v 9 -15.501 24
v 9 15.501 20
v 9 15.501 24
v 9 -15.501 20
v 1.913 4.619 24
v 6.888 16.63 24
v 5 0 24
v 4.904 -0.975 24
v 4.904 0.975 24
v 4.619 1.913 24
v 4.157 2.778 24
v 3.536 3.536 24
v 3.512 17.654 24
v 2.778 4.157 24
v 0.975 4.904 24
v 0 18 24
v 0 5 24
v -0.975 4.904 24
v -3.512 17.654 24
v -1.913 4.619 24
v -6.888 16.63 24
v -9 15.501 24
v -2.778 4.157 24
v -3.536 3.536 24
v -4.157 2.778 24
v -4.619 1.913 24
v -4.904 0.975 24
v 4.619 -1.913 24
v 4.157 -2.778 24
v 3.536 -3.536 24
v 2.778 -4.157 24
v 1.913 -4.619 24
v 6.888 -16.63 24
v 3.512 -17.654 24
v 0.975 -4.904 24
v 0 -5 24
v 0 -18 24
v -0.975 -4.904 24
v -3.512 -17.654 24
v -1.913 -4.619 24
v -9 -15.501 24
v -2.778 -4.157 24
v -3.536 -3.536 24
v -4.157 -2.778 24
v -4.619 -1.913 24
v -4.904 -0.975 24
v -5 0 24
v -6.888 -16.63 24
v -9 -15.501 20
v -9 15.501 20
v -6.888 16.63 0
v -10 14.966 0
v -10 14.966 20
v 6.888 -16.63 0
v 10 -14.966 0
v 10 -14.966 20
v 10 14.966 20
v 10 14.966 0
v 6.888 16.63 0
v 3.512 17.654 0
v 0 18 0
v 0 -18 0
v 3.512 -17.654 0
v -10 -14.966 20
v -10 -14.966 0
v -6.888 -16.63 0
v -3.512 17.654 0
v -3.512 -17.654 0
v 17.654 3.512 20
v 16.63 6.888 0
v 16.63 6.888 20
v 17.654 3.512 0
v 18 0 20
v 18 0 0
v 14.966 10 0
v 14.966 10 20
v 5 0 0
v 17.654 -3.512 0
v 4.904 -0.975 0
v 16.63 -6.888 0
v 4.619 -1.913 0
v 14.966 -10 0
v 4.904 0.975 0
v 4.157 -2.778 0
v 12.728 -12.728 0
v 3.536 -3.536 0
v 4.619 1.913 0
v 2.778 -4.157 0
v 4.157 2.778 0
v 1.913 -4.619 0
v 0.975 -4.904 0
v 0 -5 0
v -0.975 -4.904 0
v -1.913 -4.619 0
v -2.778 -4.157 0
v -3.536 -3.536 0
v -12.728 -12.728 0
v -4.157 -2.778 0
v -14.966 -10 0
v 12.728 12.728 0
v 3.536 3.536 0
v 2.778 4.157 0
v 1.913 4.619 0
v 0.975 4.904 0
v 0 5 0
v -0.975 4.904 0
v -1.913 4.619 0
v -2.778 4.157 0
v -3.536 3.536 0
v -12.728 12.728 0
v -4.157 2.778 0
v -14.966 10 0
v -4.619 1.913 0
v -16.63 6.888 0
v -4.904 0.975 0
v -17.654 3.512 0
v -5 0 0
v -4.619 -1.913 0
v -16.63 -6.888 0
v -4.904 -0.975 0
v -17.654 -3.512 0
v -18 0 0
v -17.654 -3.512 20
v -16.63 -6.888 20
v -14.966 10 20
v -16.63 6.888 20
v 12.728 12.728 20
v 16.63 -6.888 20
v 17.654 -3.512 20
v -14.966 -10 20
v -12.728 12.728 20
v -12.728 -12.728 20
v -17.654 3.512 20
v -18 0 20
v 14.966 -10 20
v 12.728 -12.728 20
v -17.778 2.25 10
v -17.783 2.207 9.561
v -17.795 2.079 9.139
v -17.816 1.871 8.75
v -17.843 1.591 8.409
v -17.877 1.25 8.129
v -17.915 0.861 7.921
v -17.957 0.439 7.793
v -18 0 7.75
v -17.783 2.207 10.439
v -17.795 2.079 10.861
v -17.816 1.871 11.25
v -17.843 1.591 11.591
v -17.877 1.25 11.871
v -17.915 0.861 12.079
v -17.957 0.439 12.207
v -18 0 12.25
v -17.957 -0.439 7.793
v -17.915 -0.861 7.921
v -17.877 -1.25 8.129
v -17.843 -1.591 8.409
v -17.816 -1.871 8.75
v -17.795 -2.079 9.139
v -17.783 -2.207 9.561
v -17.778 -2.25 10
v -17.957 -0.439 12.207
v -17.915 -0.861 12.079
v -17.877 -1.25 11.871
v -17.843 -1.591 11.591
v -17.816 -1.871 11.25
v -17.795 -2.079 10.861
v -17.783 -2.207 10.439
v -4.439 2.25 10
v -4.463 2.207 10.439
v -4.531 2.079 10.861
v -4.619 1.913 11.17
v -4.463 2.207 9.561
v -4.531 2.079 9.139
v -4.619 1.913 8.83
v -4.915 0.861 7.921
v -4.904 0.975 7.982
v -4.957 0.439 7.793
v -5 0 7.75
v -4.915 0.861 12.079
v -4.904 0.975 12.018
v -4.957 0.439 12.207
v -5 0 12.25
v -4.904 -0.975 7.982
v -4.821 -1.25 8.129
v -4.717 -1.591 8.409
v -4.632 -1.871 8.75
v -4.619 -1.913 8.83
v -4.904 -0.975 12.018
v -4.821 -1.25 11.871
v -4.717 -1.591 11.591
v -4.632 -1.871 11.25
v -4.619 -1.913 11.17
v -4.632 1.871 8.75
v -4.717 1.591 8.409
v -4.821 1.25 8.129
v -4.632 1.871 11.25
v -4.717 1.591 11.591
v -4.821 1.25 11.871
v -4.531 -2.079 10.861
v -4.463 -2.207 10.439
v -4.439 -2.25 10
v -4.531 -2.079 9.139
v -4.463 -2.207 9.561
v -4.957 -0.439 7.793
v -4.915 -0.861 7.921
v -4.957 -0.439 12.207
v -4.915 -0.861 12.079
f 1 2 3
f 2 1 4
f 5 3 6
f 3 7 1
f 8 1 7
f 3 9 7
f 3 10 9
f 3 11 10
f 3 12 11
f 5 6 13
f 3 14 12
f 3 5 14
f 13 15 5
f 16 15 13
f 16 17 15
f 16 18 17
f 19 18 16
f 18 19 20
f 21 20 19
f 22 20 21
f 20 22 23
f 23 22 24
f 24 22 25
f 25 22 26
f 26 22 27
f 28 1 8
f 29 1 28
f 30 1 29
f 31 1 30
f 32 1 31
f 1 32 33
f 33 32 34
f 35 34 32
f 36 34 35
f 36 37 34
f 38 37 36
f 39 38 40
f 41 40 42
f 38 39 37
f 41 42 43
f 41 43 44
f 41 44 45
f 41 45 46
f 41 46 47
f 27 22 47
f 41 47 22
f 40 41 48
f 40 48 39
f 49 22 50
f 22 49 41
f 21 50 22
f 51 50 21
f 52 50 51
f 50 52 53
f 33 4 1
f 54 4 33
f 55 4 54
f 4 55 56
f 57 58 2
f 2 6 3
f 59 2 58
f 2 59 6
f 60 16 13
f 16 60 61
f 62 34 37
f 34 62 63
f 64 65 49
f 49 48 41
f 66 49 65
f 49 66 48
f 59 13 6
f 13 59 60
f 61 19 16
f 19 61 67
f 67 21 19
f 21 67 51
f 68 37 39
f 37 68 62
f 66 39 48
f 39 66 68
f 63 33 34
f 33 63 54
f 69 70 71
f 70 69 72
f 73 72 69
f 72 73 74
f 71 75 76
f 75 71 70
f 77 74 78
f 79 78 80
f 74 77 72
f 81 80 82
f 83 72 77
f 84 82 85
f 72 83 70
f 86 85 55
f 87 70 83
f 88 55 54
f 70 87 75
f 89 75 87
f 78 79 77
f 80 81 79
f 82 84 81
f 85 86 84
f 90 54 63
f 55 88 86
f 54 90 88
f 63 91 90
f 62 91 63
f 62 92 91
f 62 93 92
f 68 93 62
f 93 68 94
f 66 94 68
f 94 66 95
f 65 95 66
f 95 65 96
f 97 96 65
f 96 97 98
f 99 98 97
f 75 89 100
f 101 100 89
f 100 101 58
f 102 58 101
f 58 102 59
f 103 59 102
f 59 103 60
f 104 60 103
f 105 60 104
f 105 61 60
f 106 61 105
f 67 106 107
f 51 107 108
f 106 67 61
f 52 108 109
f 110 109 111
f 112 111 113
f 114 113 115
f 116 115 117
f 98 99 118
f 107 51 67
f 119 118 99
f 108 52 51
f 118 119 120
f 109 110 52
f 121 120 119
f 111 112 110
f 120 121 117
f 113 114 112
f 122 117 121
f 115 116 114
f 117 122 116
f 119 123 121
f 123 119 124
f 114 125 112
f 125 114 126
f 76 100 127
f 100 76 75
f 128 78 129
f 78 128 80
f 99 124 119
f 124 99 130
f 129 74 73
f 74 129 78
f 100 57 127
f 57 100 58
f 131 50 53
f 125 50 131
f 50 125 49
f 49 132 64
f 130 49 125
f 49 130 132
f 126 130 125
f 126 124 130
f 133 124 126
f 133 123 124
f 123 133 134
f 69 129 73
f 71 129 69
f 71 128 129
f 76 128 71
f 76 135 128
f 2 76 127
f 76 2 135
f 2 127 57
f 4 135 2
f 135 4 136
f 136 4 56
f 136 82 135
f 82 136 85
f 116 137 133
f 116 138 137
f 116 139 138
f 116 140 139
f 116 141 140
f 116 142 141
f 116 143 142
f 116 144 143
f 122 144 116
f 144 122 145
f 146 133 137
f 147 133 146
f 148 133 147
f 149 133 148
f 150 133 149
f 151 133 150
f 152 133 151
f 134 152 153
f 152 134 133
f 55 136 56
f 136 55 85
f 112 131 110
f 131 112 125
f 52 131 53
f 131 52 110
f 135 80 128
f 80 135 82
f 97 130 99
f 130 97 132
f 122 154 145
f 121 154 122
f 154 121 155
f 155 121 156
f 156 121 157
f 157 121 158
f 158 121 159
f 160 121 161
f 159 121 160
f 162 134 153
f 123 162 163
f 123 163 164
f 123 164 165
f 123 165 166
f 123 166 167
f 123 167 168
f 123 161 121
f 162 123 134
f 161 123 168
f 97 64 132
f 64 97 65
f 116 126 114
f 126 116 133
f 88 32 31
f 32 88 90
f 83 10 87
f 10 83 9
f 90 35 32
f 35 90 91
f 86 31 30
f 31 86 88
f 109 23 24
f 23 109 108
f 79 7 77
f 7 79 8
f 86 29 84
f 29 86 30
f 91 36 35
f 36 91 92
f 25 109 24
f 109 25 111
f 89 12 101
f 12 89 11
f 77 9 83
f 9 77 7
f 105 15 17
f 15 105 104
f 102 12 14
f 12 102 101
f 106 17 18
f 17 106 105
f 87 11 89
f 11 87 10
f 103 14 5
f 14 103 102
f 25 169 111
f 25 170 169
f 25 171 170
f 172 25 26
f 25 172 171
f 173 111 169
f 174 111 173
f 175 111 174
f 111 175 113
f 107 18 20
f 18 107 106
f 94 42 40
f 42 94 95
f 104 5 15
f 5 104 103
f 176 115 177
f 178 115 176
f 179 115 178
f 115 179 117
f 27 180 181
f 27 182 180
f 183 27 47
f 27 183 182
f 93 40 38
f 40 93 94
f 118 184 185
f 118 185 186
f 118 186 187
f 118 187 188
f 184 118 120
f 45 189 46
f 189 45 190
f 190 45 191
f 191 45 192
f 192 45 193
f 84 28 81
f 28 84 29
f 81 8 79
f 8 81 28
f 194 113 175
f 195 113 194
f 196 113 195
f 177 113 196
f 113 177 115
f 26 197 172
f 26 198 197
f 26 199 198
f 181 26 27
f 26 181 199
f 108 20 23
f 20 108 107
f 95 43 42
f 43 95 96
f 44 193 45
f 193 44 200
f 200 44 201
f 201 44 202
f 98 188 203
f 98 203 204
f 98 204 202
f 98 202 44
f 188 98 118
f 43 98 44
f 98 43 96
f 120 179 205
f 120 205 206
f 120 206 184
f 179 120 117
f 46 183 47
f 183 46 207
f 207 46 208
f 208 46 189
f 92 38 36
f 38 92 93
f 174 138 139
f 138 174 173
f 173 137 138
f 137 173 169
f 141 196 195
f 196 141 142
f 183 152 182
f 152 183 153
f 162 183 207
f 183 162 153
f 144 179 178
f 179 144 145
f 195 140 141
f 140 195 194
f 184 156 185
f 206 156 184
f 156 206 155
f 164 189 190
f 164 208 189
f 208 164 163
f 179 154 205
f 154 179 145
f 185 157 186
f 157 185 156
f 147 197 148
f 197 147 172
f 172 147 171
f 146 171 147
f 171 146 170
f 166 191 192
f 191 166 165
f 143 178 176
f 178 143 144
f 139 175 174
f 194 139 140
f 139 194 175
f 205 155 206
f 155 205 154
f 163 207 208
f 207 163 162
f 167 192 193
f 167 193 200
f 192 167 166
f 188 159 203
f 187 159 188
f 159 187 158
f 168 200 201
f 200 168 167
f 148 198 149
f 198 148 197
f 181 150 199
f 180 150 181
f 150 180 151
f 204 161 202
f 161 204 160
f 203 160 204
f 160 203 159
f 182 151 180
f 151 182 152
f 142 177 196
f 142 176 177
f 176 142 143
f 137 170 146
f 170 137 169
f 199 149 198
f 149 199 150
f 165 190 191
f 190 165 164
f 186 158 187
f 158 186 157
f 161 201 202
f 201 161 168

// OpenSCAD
$fn = 32;

// ----------------------------------------------------------------------
// Oldham coupling hub: 36 x 24 mm
// ----------------------------------------------------------------------

// --- parameters (mm) ---
hub_d = 36;               // hub diameter
hub_l = 20;               // hub length
bore_d = 10;              // shaft bore
tongue_w = 18;            // drive tongue width
tongue_h = 4;             // drive tongue height
set_d = 4.5;              // set screw tap hole

module hub() {
  cylinder(h = hub_l, d = hub_d);
  /* tongue, clipped to the hub disc and sunk 1 mm into the face */
  intersection() {
    translate([-tongue_w / 2, -hub_d / 2, hub_l - 1])
      cube([tongue_w, hub_d, tongue_h + 1]);
    translate([0, 0, hub_l - 1]) cylinder(h = tongue_h + 1, d = hub_d);
  }
}

difference() {
  hub();
  translate([0, 0, -1]) cylinder(h = hub_l + tongue_h + 2, d = bore_d);
  translate([-hub_d / 2 - 1, 0, hub_l * 0.5])
    rotate([0, 90, 0]) cylinder(h = hub_d / 2 + 2, d = set_d);
}
